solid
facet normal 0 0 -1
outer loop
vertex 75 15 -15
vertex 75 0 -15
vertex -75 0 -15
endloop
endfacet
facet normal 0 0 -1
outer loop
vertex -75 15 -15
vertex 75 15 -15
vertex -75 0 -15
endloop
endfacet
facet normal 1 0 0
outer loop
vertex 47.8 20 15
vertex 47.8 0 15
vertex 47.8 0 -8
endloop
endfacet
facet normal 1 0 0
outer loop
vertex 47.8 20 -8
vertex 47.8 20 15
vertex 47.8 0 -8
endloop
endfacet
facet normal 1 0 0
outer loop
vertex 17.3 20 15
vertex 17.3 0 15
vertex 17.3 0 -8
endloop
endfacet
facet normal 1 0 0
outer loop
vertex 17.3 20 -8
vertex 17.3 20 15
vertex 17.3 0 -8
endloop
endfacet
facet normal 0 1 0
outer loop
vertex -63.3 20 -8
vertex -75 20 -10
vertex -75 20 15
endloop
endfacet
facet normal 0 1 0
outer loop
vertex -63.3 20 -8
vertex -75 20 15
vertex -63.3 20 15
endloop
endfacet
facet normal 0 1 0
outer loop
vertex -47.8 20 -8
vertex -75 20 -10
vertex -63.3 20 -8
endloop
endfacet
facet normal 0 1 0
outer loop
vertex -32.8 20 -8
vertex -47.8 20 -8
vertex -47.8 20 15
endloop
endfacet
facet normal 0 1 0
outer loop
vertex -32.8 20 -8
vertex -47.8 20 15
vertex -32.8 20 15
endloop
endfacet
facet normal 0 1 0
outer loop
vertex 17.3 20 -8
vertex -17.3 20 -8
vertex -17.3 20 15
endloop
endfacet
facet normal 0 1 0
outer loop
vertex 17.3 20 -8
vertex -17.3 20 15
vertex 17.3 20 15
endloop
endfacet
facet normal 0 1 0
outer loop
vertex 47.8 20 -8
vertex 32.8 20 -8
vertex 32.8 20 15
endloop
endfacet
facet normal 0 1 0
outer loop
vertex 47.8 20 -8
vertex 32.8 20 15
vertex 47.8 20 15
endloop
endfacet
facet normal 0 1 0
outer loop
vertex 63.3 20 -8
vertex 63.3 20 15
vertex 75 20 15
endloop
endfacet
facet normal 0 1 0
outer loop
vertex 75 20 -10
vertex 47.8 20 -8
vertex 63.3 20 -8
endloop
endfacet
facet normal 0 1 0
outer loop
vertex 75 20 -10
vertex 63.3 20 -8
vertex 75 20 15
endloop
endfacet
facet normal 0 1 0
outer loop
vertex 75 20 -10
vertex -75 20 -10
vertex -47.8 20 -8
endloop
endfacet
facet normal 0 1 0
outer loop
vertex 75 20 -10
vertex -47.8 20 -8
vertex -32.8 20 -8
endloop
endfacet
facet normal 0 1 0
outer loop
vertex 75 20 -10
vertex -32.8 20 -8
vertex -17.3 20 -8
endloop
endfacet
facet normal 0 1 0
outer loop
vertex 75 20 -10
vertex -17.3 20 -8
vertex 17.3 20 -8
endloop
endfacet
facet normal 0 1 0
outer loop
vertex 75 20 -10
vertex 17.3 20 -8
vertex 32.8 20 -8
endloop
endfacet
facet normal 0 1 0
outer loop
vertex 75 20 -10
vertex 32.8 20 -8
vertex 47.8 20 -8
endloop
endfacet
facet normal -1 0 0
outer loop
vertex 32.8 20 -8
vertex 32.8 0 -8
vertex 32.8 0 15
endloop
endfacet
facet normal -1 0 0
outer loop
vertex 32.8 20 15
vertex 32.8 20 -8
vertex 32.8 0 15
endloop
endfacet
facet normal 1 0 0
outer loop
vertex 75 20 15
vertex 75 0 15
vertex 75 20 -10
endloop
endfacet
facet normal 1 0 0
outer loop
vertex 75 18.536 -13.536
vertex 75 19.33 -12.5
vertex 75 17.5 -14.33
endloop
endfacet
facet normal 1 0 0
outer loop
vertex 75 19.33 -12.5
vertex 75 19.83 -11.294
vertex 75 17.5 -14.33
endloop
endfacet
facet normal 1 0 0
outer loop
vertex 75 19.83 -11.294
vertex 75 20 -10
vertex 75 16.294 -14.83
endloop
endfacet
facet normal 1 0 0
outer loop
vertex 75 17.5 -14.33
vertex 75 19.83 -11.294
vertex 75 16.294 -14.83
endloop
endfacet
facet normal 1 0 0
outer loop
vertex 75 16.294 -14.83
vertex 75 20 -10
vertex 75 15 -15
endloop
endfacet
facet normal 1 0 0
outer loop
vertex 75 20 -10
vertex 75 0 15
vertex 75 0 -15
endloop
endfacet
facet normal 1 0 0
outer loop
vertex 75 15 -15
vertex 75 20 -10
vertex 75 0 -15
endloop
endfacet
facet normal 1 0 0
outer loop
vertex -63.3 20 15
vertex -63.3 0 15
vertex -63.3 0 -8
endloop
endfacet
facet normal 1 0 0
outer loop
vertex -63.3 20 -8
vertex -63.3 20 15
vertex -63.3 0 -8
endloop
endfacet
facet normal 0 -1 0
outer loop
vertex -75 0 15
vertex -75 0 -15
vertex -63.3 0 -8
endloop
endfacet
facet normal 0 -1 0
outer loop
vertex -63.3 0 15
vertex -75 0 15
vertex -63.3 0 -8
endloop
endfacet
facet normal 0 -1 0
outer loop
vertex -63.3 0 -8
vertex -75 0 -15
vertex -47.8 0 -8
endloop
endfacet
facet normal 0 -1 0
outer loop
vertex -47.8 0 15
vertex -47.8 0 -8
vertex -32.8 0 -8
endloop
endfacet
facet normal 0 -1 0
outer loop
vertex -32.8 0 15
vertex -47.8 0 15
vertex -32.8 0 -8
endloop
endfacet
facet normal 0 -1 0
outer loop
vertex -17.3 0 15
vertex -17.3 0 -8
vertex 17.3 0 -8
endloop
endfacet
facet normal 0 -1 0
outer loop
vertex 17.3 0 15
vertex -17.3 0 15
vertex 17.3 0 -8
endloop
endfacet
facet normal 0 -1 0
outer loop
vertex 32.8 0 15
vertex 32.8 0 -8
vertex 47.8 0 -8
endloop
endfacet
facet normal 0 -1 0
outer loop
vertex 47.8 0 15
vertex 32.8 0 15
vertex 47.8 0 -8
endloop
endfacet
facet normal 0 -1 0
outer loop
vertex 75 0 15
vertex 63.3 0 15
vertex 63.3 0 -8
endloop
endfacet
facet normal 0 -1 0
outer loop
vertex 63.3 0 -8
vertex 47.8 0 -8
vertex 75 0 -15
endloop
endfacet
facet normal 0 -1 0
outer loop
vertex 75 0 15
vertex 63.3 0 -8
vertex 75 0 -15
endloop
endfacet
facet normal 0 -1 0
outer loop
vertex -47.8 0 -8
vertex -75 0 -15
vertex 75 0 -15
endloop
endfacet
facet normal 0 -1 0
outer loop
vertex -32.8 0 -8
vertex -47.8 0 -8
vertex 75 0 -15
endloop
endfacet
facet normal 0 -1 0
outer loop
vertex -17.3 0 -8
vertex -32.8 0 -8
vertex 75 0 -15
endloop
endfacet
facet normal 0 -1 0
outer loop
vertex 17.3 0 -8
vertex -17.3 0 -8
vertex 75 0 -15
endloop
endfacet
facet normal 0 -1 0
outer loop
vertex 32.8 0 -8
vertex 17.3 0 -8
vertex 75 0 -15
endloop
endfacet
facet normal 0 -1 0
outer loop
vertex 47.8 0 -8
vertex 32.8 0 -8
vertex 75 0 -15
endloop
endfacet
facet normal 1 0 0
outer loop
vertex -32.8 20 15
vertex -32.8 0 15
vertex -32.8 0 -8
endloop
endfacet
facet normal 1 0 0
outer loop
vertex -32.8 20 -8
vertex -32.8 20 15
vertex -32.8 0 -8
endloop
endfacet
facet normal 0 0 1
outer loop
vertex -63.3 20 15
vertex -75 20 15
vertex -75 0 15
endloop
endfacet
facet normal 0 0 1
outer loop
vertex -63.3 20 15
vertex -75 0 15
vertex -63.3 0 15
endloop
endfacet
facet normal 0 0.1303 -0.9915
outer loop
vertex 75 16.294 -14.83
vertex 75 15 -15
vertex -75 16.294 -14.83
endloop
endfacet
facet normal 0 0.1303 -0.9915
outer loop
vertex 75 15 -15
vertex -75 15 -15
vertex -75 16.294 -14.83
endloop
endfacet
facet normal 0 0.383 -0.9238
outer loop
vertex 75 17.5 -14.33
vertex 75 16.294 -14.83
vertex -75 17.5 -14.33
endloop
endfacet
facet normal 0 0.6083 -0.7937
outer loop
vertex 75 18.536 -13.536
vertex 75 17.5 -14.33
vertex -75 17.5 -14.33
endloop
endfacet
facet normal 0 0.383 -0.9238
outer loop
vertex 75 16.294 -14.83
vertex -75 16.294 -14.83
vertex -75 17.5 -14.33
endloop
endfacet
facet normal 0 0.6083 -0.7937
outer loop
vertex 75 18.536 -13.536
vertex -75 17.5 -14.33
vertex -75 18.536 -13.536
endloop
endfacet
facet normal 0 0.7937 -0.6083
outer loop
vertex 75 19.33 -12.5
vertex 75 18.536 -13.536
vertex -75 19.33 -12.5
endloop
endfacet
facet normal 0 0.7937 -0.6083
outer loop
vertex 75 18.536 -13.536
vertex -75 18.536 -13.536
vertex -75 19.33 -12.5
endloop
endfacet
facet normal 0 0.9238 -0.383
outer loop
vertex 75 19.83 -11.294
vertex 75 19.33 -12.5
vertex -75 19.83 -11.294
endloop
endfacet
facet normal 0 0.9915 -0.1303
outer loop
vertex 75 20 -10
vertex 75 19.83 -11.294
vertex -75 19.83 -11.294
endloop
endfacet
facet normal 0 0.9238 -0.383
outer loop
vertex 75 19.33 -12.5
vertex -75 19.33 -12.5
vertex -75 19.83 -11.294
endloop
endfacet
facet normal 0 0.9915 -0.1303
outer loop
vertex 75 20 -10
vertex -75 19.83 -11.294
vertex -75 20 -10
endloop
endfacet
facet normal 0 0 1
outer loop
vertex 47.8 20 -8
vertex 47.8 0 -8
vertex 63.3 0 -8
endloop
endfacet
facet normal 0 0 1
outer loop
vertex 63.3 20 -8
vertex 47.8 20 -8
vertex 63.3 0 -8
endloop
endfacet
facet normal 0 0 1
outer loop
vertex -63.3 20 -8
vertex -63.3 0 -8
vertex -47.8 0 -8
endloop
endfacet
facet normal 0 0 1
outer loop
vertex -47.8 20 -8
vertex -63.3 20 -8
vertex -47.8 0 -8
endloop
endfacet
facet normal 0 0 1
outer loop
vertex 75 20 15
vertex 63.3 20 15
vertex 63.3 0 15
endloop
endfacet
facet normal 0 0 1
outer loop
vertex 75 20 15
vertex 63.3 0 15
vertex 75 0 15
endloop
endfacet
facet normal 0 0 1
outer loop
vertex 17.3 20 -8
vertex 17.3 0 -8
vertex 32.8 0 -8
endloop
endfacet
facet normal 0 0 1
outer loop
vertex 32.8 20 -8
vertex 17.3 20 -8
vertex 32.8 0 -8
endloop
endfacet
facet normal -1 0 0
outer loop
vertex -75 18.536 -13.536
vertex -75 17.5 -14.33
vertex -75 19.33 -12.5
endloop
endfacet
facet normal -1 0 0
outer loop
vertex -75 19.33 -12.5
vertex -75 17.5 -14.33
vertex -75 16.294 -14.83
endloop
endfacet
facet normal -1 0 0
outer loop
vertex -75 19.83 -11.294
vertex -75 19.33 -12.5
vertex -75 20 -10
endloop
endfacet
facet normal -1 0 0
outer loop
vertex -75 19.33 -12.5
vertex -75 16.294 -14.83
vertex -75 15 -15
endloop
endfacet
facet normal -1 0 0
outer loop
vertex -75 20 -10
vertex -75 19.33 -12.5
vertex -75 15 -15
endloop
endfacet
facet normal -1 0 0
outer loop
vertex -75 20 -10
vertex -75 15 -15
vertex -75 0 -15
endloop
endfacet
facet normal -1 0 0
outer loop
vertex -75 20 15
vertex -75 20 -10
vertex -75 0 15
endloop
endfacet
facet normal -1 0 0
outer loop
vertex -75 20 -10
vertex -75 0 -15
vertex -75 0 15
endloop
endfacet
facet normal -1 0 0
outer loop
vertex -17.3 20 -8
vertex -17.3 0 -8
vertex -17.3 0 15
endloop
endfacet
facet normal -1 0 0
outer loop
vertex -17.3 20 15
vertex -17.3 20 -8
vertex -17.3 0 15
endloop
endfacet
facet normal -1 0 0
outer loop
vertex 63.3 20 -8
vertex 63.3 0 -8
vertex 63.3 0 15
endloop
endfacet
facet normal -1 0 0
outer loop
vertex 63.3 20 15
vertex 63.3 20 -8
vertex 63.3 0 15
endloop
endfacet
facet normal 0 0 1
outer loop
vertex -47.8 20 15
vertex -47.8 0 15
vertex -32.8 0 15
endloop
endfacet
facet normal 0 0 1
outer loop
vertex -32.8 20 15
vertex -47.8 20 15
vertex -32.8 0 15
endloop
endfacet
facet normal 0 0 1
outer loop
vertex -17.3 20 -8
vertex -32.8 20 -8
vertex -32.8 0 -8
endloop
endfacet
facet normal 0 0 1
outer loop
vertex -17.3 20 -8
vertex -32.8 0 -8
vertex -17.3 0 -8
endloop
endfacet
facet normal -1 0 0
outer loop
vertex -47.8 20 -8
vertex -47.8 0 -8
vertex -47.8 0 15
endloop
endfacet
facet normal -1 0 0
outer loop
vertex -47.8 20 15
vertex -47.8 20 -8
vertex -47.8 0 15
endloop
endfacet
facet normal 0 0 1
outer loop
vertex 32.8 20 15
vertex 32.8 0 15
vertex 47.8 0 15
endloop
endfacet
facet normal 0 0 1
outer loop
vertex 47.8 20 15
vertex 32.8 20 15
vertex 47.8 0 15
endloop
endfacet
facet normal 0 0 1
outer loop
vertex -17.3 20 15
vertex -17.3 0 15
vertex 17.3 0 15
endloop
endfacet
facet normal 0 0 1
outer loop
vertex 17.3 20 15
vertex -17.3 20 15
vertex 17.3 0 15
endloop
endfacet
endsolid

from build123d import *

# Parameters (mm, degrees)
BOSS_EXTRUDE1_DEPTH = 20
FILLET1_R           = 5


with BuildPart() as part:
    # Sketch1 → Boss-Extrude1 (new body)
    with BuildSketch(Plane(origin=(0, 0, 0), x_dir=(1, 0, 0), z_dir=(0, 1, 0))):
        Polygon((-75, 15), (-75, -15), (-63.3, -15), (-63.3, 8), (-47.8, 8), (-47.8, -15), (-32.8, -15), (-32.8, 8), (-17.3, 8), (-17.3, -15), (17.3, -15), (17.3, 8), (32.8, 8), (32.8, -15), (47.8, -15), (47.8, 8), (63.3, 8), (63.3, -15), (75, -15), (75, 15), align=None)
    extrude(amount=BOSS_EXTRUDE1_DEPTH)

    # Fillet1
    fillet1_edges = [part.edges().sort_by_distance(p)[0] for p in [
        (0, 20, -15),
    ]]
    fillet(fillet1_edges, radius=FILLET1_R)


solid = part.part
